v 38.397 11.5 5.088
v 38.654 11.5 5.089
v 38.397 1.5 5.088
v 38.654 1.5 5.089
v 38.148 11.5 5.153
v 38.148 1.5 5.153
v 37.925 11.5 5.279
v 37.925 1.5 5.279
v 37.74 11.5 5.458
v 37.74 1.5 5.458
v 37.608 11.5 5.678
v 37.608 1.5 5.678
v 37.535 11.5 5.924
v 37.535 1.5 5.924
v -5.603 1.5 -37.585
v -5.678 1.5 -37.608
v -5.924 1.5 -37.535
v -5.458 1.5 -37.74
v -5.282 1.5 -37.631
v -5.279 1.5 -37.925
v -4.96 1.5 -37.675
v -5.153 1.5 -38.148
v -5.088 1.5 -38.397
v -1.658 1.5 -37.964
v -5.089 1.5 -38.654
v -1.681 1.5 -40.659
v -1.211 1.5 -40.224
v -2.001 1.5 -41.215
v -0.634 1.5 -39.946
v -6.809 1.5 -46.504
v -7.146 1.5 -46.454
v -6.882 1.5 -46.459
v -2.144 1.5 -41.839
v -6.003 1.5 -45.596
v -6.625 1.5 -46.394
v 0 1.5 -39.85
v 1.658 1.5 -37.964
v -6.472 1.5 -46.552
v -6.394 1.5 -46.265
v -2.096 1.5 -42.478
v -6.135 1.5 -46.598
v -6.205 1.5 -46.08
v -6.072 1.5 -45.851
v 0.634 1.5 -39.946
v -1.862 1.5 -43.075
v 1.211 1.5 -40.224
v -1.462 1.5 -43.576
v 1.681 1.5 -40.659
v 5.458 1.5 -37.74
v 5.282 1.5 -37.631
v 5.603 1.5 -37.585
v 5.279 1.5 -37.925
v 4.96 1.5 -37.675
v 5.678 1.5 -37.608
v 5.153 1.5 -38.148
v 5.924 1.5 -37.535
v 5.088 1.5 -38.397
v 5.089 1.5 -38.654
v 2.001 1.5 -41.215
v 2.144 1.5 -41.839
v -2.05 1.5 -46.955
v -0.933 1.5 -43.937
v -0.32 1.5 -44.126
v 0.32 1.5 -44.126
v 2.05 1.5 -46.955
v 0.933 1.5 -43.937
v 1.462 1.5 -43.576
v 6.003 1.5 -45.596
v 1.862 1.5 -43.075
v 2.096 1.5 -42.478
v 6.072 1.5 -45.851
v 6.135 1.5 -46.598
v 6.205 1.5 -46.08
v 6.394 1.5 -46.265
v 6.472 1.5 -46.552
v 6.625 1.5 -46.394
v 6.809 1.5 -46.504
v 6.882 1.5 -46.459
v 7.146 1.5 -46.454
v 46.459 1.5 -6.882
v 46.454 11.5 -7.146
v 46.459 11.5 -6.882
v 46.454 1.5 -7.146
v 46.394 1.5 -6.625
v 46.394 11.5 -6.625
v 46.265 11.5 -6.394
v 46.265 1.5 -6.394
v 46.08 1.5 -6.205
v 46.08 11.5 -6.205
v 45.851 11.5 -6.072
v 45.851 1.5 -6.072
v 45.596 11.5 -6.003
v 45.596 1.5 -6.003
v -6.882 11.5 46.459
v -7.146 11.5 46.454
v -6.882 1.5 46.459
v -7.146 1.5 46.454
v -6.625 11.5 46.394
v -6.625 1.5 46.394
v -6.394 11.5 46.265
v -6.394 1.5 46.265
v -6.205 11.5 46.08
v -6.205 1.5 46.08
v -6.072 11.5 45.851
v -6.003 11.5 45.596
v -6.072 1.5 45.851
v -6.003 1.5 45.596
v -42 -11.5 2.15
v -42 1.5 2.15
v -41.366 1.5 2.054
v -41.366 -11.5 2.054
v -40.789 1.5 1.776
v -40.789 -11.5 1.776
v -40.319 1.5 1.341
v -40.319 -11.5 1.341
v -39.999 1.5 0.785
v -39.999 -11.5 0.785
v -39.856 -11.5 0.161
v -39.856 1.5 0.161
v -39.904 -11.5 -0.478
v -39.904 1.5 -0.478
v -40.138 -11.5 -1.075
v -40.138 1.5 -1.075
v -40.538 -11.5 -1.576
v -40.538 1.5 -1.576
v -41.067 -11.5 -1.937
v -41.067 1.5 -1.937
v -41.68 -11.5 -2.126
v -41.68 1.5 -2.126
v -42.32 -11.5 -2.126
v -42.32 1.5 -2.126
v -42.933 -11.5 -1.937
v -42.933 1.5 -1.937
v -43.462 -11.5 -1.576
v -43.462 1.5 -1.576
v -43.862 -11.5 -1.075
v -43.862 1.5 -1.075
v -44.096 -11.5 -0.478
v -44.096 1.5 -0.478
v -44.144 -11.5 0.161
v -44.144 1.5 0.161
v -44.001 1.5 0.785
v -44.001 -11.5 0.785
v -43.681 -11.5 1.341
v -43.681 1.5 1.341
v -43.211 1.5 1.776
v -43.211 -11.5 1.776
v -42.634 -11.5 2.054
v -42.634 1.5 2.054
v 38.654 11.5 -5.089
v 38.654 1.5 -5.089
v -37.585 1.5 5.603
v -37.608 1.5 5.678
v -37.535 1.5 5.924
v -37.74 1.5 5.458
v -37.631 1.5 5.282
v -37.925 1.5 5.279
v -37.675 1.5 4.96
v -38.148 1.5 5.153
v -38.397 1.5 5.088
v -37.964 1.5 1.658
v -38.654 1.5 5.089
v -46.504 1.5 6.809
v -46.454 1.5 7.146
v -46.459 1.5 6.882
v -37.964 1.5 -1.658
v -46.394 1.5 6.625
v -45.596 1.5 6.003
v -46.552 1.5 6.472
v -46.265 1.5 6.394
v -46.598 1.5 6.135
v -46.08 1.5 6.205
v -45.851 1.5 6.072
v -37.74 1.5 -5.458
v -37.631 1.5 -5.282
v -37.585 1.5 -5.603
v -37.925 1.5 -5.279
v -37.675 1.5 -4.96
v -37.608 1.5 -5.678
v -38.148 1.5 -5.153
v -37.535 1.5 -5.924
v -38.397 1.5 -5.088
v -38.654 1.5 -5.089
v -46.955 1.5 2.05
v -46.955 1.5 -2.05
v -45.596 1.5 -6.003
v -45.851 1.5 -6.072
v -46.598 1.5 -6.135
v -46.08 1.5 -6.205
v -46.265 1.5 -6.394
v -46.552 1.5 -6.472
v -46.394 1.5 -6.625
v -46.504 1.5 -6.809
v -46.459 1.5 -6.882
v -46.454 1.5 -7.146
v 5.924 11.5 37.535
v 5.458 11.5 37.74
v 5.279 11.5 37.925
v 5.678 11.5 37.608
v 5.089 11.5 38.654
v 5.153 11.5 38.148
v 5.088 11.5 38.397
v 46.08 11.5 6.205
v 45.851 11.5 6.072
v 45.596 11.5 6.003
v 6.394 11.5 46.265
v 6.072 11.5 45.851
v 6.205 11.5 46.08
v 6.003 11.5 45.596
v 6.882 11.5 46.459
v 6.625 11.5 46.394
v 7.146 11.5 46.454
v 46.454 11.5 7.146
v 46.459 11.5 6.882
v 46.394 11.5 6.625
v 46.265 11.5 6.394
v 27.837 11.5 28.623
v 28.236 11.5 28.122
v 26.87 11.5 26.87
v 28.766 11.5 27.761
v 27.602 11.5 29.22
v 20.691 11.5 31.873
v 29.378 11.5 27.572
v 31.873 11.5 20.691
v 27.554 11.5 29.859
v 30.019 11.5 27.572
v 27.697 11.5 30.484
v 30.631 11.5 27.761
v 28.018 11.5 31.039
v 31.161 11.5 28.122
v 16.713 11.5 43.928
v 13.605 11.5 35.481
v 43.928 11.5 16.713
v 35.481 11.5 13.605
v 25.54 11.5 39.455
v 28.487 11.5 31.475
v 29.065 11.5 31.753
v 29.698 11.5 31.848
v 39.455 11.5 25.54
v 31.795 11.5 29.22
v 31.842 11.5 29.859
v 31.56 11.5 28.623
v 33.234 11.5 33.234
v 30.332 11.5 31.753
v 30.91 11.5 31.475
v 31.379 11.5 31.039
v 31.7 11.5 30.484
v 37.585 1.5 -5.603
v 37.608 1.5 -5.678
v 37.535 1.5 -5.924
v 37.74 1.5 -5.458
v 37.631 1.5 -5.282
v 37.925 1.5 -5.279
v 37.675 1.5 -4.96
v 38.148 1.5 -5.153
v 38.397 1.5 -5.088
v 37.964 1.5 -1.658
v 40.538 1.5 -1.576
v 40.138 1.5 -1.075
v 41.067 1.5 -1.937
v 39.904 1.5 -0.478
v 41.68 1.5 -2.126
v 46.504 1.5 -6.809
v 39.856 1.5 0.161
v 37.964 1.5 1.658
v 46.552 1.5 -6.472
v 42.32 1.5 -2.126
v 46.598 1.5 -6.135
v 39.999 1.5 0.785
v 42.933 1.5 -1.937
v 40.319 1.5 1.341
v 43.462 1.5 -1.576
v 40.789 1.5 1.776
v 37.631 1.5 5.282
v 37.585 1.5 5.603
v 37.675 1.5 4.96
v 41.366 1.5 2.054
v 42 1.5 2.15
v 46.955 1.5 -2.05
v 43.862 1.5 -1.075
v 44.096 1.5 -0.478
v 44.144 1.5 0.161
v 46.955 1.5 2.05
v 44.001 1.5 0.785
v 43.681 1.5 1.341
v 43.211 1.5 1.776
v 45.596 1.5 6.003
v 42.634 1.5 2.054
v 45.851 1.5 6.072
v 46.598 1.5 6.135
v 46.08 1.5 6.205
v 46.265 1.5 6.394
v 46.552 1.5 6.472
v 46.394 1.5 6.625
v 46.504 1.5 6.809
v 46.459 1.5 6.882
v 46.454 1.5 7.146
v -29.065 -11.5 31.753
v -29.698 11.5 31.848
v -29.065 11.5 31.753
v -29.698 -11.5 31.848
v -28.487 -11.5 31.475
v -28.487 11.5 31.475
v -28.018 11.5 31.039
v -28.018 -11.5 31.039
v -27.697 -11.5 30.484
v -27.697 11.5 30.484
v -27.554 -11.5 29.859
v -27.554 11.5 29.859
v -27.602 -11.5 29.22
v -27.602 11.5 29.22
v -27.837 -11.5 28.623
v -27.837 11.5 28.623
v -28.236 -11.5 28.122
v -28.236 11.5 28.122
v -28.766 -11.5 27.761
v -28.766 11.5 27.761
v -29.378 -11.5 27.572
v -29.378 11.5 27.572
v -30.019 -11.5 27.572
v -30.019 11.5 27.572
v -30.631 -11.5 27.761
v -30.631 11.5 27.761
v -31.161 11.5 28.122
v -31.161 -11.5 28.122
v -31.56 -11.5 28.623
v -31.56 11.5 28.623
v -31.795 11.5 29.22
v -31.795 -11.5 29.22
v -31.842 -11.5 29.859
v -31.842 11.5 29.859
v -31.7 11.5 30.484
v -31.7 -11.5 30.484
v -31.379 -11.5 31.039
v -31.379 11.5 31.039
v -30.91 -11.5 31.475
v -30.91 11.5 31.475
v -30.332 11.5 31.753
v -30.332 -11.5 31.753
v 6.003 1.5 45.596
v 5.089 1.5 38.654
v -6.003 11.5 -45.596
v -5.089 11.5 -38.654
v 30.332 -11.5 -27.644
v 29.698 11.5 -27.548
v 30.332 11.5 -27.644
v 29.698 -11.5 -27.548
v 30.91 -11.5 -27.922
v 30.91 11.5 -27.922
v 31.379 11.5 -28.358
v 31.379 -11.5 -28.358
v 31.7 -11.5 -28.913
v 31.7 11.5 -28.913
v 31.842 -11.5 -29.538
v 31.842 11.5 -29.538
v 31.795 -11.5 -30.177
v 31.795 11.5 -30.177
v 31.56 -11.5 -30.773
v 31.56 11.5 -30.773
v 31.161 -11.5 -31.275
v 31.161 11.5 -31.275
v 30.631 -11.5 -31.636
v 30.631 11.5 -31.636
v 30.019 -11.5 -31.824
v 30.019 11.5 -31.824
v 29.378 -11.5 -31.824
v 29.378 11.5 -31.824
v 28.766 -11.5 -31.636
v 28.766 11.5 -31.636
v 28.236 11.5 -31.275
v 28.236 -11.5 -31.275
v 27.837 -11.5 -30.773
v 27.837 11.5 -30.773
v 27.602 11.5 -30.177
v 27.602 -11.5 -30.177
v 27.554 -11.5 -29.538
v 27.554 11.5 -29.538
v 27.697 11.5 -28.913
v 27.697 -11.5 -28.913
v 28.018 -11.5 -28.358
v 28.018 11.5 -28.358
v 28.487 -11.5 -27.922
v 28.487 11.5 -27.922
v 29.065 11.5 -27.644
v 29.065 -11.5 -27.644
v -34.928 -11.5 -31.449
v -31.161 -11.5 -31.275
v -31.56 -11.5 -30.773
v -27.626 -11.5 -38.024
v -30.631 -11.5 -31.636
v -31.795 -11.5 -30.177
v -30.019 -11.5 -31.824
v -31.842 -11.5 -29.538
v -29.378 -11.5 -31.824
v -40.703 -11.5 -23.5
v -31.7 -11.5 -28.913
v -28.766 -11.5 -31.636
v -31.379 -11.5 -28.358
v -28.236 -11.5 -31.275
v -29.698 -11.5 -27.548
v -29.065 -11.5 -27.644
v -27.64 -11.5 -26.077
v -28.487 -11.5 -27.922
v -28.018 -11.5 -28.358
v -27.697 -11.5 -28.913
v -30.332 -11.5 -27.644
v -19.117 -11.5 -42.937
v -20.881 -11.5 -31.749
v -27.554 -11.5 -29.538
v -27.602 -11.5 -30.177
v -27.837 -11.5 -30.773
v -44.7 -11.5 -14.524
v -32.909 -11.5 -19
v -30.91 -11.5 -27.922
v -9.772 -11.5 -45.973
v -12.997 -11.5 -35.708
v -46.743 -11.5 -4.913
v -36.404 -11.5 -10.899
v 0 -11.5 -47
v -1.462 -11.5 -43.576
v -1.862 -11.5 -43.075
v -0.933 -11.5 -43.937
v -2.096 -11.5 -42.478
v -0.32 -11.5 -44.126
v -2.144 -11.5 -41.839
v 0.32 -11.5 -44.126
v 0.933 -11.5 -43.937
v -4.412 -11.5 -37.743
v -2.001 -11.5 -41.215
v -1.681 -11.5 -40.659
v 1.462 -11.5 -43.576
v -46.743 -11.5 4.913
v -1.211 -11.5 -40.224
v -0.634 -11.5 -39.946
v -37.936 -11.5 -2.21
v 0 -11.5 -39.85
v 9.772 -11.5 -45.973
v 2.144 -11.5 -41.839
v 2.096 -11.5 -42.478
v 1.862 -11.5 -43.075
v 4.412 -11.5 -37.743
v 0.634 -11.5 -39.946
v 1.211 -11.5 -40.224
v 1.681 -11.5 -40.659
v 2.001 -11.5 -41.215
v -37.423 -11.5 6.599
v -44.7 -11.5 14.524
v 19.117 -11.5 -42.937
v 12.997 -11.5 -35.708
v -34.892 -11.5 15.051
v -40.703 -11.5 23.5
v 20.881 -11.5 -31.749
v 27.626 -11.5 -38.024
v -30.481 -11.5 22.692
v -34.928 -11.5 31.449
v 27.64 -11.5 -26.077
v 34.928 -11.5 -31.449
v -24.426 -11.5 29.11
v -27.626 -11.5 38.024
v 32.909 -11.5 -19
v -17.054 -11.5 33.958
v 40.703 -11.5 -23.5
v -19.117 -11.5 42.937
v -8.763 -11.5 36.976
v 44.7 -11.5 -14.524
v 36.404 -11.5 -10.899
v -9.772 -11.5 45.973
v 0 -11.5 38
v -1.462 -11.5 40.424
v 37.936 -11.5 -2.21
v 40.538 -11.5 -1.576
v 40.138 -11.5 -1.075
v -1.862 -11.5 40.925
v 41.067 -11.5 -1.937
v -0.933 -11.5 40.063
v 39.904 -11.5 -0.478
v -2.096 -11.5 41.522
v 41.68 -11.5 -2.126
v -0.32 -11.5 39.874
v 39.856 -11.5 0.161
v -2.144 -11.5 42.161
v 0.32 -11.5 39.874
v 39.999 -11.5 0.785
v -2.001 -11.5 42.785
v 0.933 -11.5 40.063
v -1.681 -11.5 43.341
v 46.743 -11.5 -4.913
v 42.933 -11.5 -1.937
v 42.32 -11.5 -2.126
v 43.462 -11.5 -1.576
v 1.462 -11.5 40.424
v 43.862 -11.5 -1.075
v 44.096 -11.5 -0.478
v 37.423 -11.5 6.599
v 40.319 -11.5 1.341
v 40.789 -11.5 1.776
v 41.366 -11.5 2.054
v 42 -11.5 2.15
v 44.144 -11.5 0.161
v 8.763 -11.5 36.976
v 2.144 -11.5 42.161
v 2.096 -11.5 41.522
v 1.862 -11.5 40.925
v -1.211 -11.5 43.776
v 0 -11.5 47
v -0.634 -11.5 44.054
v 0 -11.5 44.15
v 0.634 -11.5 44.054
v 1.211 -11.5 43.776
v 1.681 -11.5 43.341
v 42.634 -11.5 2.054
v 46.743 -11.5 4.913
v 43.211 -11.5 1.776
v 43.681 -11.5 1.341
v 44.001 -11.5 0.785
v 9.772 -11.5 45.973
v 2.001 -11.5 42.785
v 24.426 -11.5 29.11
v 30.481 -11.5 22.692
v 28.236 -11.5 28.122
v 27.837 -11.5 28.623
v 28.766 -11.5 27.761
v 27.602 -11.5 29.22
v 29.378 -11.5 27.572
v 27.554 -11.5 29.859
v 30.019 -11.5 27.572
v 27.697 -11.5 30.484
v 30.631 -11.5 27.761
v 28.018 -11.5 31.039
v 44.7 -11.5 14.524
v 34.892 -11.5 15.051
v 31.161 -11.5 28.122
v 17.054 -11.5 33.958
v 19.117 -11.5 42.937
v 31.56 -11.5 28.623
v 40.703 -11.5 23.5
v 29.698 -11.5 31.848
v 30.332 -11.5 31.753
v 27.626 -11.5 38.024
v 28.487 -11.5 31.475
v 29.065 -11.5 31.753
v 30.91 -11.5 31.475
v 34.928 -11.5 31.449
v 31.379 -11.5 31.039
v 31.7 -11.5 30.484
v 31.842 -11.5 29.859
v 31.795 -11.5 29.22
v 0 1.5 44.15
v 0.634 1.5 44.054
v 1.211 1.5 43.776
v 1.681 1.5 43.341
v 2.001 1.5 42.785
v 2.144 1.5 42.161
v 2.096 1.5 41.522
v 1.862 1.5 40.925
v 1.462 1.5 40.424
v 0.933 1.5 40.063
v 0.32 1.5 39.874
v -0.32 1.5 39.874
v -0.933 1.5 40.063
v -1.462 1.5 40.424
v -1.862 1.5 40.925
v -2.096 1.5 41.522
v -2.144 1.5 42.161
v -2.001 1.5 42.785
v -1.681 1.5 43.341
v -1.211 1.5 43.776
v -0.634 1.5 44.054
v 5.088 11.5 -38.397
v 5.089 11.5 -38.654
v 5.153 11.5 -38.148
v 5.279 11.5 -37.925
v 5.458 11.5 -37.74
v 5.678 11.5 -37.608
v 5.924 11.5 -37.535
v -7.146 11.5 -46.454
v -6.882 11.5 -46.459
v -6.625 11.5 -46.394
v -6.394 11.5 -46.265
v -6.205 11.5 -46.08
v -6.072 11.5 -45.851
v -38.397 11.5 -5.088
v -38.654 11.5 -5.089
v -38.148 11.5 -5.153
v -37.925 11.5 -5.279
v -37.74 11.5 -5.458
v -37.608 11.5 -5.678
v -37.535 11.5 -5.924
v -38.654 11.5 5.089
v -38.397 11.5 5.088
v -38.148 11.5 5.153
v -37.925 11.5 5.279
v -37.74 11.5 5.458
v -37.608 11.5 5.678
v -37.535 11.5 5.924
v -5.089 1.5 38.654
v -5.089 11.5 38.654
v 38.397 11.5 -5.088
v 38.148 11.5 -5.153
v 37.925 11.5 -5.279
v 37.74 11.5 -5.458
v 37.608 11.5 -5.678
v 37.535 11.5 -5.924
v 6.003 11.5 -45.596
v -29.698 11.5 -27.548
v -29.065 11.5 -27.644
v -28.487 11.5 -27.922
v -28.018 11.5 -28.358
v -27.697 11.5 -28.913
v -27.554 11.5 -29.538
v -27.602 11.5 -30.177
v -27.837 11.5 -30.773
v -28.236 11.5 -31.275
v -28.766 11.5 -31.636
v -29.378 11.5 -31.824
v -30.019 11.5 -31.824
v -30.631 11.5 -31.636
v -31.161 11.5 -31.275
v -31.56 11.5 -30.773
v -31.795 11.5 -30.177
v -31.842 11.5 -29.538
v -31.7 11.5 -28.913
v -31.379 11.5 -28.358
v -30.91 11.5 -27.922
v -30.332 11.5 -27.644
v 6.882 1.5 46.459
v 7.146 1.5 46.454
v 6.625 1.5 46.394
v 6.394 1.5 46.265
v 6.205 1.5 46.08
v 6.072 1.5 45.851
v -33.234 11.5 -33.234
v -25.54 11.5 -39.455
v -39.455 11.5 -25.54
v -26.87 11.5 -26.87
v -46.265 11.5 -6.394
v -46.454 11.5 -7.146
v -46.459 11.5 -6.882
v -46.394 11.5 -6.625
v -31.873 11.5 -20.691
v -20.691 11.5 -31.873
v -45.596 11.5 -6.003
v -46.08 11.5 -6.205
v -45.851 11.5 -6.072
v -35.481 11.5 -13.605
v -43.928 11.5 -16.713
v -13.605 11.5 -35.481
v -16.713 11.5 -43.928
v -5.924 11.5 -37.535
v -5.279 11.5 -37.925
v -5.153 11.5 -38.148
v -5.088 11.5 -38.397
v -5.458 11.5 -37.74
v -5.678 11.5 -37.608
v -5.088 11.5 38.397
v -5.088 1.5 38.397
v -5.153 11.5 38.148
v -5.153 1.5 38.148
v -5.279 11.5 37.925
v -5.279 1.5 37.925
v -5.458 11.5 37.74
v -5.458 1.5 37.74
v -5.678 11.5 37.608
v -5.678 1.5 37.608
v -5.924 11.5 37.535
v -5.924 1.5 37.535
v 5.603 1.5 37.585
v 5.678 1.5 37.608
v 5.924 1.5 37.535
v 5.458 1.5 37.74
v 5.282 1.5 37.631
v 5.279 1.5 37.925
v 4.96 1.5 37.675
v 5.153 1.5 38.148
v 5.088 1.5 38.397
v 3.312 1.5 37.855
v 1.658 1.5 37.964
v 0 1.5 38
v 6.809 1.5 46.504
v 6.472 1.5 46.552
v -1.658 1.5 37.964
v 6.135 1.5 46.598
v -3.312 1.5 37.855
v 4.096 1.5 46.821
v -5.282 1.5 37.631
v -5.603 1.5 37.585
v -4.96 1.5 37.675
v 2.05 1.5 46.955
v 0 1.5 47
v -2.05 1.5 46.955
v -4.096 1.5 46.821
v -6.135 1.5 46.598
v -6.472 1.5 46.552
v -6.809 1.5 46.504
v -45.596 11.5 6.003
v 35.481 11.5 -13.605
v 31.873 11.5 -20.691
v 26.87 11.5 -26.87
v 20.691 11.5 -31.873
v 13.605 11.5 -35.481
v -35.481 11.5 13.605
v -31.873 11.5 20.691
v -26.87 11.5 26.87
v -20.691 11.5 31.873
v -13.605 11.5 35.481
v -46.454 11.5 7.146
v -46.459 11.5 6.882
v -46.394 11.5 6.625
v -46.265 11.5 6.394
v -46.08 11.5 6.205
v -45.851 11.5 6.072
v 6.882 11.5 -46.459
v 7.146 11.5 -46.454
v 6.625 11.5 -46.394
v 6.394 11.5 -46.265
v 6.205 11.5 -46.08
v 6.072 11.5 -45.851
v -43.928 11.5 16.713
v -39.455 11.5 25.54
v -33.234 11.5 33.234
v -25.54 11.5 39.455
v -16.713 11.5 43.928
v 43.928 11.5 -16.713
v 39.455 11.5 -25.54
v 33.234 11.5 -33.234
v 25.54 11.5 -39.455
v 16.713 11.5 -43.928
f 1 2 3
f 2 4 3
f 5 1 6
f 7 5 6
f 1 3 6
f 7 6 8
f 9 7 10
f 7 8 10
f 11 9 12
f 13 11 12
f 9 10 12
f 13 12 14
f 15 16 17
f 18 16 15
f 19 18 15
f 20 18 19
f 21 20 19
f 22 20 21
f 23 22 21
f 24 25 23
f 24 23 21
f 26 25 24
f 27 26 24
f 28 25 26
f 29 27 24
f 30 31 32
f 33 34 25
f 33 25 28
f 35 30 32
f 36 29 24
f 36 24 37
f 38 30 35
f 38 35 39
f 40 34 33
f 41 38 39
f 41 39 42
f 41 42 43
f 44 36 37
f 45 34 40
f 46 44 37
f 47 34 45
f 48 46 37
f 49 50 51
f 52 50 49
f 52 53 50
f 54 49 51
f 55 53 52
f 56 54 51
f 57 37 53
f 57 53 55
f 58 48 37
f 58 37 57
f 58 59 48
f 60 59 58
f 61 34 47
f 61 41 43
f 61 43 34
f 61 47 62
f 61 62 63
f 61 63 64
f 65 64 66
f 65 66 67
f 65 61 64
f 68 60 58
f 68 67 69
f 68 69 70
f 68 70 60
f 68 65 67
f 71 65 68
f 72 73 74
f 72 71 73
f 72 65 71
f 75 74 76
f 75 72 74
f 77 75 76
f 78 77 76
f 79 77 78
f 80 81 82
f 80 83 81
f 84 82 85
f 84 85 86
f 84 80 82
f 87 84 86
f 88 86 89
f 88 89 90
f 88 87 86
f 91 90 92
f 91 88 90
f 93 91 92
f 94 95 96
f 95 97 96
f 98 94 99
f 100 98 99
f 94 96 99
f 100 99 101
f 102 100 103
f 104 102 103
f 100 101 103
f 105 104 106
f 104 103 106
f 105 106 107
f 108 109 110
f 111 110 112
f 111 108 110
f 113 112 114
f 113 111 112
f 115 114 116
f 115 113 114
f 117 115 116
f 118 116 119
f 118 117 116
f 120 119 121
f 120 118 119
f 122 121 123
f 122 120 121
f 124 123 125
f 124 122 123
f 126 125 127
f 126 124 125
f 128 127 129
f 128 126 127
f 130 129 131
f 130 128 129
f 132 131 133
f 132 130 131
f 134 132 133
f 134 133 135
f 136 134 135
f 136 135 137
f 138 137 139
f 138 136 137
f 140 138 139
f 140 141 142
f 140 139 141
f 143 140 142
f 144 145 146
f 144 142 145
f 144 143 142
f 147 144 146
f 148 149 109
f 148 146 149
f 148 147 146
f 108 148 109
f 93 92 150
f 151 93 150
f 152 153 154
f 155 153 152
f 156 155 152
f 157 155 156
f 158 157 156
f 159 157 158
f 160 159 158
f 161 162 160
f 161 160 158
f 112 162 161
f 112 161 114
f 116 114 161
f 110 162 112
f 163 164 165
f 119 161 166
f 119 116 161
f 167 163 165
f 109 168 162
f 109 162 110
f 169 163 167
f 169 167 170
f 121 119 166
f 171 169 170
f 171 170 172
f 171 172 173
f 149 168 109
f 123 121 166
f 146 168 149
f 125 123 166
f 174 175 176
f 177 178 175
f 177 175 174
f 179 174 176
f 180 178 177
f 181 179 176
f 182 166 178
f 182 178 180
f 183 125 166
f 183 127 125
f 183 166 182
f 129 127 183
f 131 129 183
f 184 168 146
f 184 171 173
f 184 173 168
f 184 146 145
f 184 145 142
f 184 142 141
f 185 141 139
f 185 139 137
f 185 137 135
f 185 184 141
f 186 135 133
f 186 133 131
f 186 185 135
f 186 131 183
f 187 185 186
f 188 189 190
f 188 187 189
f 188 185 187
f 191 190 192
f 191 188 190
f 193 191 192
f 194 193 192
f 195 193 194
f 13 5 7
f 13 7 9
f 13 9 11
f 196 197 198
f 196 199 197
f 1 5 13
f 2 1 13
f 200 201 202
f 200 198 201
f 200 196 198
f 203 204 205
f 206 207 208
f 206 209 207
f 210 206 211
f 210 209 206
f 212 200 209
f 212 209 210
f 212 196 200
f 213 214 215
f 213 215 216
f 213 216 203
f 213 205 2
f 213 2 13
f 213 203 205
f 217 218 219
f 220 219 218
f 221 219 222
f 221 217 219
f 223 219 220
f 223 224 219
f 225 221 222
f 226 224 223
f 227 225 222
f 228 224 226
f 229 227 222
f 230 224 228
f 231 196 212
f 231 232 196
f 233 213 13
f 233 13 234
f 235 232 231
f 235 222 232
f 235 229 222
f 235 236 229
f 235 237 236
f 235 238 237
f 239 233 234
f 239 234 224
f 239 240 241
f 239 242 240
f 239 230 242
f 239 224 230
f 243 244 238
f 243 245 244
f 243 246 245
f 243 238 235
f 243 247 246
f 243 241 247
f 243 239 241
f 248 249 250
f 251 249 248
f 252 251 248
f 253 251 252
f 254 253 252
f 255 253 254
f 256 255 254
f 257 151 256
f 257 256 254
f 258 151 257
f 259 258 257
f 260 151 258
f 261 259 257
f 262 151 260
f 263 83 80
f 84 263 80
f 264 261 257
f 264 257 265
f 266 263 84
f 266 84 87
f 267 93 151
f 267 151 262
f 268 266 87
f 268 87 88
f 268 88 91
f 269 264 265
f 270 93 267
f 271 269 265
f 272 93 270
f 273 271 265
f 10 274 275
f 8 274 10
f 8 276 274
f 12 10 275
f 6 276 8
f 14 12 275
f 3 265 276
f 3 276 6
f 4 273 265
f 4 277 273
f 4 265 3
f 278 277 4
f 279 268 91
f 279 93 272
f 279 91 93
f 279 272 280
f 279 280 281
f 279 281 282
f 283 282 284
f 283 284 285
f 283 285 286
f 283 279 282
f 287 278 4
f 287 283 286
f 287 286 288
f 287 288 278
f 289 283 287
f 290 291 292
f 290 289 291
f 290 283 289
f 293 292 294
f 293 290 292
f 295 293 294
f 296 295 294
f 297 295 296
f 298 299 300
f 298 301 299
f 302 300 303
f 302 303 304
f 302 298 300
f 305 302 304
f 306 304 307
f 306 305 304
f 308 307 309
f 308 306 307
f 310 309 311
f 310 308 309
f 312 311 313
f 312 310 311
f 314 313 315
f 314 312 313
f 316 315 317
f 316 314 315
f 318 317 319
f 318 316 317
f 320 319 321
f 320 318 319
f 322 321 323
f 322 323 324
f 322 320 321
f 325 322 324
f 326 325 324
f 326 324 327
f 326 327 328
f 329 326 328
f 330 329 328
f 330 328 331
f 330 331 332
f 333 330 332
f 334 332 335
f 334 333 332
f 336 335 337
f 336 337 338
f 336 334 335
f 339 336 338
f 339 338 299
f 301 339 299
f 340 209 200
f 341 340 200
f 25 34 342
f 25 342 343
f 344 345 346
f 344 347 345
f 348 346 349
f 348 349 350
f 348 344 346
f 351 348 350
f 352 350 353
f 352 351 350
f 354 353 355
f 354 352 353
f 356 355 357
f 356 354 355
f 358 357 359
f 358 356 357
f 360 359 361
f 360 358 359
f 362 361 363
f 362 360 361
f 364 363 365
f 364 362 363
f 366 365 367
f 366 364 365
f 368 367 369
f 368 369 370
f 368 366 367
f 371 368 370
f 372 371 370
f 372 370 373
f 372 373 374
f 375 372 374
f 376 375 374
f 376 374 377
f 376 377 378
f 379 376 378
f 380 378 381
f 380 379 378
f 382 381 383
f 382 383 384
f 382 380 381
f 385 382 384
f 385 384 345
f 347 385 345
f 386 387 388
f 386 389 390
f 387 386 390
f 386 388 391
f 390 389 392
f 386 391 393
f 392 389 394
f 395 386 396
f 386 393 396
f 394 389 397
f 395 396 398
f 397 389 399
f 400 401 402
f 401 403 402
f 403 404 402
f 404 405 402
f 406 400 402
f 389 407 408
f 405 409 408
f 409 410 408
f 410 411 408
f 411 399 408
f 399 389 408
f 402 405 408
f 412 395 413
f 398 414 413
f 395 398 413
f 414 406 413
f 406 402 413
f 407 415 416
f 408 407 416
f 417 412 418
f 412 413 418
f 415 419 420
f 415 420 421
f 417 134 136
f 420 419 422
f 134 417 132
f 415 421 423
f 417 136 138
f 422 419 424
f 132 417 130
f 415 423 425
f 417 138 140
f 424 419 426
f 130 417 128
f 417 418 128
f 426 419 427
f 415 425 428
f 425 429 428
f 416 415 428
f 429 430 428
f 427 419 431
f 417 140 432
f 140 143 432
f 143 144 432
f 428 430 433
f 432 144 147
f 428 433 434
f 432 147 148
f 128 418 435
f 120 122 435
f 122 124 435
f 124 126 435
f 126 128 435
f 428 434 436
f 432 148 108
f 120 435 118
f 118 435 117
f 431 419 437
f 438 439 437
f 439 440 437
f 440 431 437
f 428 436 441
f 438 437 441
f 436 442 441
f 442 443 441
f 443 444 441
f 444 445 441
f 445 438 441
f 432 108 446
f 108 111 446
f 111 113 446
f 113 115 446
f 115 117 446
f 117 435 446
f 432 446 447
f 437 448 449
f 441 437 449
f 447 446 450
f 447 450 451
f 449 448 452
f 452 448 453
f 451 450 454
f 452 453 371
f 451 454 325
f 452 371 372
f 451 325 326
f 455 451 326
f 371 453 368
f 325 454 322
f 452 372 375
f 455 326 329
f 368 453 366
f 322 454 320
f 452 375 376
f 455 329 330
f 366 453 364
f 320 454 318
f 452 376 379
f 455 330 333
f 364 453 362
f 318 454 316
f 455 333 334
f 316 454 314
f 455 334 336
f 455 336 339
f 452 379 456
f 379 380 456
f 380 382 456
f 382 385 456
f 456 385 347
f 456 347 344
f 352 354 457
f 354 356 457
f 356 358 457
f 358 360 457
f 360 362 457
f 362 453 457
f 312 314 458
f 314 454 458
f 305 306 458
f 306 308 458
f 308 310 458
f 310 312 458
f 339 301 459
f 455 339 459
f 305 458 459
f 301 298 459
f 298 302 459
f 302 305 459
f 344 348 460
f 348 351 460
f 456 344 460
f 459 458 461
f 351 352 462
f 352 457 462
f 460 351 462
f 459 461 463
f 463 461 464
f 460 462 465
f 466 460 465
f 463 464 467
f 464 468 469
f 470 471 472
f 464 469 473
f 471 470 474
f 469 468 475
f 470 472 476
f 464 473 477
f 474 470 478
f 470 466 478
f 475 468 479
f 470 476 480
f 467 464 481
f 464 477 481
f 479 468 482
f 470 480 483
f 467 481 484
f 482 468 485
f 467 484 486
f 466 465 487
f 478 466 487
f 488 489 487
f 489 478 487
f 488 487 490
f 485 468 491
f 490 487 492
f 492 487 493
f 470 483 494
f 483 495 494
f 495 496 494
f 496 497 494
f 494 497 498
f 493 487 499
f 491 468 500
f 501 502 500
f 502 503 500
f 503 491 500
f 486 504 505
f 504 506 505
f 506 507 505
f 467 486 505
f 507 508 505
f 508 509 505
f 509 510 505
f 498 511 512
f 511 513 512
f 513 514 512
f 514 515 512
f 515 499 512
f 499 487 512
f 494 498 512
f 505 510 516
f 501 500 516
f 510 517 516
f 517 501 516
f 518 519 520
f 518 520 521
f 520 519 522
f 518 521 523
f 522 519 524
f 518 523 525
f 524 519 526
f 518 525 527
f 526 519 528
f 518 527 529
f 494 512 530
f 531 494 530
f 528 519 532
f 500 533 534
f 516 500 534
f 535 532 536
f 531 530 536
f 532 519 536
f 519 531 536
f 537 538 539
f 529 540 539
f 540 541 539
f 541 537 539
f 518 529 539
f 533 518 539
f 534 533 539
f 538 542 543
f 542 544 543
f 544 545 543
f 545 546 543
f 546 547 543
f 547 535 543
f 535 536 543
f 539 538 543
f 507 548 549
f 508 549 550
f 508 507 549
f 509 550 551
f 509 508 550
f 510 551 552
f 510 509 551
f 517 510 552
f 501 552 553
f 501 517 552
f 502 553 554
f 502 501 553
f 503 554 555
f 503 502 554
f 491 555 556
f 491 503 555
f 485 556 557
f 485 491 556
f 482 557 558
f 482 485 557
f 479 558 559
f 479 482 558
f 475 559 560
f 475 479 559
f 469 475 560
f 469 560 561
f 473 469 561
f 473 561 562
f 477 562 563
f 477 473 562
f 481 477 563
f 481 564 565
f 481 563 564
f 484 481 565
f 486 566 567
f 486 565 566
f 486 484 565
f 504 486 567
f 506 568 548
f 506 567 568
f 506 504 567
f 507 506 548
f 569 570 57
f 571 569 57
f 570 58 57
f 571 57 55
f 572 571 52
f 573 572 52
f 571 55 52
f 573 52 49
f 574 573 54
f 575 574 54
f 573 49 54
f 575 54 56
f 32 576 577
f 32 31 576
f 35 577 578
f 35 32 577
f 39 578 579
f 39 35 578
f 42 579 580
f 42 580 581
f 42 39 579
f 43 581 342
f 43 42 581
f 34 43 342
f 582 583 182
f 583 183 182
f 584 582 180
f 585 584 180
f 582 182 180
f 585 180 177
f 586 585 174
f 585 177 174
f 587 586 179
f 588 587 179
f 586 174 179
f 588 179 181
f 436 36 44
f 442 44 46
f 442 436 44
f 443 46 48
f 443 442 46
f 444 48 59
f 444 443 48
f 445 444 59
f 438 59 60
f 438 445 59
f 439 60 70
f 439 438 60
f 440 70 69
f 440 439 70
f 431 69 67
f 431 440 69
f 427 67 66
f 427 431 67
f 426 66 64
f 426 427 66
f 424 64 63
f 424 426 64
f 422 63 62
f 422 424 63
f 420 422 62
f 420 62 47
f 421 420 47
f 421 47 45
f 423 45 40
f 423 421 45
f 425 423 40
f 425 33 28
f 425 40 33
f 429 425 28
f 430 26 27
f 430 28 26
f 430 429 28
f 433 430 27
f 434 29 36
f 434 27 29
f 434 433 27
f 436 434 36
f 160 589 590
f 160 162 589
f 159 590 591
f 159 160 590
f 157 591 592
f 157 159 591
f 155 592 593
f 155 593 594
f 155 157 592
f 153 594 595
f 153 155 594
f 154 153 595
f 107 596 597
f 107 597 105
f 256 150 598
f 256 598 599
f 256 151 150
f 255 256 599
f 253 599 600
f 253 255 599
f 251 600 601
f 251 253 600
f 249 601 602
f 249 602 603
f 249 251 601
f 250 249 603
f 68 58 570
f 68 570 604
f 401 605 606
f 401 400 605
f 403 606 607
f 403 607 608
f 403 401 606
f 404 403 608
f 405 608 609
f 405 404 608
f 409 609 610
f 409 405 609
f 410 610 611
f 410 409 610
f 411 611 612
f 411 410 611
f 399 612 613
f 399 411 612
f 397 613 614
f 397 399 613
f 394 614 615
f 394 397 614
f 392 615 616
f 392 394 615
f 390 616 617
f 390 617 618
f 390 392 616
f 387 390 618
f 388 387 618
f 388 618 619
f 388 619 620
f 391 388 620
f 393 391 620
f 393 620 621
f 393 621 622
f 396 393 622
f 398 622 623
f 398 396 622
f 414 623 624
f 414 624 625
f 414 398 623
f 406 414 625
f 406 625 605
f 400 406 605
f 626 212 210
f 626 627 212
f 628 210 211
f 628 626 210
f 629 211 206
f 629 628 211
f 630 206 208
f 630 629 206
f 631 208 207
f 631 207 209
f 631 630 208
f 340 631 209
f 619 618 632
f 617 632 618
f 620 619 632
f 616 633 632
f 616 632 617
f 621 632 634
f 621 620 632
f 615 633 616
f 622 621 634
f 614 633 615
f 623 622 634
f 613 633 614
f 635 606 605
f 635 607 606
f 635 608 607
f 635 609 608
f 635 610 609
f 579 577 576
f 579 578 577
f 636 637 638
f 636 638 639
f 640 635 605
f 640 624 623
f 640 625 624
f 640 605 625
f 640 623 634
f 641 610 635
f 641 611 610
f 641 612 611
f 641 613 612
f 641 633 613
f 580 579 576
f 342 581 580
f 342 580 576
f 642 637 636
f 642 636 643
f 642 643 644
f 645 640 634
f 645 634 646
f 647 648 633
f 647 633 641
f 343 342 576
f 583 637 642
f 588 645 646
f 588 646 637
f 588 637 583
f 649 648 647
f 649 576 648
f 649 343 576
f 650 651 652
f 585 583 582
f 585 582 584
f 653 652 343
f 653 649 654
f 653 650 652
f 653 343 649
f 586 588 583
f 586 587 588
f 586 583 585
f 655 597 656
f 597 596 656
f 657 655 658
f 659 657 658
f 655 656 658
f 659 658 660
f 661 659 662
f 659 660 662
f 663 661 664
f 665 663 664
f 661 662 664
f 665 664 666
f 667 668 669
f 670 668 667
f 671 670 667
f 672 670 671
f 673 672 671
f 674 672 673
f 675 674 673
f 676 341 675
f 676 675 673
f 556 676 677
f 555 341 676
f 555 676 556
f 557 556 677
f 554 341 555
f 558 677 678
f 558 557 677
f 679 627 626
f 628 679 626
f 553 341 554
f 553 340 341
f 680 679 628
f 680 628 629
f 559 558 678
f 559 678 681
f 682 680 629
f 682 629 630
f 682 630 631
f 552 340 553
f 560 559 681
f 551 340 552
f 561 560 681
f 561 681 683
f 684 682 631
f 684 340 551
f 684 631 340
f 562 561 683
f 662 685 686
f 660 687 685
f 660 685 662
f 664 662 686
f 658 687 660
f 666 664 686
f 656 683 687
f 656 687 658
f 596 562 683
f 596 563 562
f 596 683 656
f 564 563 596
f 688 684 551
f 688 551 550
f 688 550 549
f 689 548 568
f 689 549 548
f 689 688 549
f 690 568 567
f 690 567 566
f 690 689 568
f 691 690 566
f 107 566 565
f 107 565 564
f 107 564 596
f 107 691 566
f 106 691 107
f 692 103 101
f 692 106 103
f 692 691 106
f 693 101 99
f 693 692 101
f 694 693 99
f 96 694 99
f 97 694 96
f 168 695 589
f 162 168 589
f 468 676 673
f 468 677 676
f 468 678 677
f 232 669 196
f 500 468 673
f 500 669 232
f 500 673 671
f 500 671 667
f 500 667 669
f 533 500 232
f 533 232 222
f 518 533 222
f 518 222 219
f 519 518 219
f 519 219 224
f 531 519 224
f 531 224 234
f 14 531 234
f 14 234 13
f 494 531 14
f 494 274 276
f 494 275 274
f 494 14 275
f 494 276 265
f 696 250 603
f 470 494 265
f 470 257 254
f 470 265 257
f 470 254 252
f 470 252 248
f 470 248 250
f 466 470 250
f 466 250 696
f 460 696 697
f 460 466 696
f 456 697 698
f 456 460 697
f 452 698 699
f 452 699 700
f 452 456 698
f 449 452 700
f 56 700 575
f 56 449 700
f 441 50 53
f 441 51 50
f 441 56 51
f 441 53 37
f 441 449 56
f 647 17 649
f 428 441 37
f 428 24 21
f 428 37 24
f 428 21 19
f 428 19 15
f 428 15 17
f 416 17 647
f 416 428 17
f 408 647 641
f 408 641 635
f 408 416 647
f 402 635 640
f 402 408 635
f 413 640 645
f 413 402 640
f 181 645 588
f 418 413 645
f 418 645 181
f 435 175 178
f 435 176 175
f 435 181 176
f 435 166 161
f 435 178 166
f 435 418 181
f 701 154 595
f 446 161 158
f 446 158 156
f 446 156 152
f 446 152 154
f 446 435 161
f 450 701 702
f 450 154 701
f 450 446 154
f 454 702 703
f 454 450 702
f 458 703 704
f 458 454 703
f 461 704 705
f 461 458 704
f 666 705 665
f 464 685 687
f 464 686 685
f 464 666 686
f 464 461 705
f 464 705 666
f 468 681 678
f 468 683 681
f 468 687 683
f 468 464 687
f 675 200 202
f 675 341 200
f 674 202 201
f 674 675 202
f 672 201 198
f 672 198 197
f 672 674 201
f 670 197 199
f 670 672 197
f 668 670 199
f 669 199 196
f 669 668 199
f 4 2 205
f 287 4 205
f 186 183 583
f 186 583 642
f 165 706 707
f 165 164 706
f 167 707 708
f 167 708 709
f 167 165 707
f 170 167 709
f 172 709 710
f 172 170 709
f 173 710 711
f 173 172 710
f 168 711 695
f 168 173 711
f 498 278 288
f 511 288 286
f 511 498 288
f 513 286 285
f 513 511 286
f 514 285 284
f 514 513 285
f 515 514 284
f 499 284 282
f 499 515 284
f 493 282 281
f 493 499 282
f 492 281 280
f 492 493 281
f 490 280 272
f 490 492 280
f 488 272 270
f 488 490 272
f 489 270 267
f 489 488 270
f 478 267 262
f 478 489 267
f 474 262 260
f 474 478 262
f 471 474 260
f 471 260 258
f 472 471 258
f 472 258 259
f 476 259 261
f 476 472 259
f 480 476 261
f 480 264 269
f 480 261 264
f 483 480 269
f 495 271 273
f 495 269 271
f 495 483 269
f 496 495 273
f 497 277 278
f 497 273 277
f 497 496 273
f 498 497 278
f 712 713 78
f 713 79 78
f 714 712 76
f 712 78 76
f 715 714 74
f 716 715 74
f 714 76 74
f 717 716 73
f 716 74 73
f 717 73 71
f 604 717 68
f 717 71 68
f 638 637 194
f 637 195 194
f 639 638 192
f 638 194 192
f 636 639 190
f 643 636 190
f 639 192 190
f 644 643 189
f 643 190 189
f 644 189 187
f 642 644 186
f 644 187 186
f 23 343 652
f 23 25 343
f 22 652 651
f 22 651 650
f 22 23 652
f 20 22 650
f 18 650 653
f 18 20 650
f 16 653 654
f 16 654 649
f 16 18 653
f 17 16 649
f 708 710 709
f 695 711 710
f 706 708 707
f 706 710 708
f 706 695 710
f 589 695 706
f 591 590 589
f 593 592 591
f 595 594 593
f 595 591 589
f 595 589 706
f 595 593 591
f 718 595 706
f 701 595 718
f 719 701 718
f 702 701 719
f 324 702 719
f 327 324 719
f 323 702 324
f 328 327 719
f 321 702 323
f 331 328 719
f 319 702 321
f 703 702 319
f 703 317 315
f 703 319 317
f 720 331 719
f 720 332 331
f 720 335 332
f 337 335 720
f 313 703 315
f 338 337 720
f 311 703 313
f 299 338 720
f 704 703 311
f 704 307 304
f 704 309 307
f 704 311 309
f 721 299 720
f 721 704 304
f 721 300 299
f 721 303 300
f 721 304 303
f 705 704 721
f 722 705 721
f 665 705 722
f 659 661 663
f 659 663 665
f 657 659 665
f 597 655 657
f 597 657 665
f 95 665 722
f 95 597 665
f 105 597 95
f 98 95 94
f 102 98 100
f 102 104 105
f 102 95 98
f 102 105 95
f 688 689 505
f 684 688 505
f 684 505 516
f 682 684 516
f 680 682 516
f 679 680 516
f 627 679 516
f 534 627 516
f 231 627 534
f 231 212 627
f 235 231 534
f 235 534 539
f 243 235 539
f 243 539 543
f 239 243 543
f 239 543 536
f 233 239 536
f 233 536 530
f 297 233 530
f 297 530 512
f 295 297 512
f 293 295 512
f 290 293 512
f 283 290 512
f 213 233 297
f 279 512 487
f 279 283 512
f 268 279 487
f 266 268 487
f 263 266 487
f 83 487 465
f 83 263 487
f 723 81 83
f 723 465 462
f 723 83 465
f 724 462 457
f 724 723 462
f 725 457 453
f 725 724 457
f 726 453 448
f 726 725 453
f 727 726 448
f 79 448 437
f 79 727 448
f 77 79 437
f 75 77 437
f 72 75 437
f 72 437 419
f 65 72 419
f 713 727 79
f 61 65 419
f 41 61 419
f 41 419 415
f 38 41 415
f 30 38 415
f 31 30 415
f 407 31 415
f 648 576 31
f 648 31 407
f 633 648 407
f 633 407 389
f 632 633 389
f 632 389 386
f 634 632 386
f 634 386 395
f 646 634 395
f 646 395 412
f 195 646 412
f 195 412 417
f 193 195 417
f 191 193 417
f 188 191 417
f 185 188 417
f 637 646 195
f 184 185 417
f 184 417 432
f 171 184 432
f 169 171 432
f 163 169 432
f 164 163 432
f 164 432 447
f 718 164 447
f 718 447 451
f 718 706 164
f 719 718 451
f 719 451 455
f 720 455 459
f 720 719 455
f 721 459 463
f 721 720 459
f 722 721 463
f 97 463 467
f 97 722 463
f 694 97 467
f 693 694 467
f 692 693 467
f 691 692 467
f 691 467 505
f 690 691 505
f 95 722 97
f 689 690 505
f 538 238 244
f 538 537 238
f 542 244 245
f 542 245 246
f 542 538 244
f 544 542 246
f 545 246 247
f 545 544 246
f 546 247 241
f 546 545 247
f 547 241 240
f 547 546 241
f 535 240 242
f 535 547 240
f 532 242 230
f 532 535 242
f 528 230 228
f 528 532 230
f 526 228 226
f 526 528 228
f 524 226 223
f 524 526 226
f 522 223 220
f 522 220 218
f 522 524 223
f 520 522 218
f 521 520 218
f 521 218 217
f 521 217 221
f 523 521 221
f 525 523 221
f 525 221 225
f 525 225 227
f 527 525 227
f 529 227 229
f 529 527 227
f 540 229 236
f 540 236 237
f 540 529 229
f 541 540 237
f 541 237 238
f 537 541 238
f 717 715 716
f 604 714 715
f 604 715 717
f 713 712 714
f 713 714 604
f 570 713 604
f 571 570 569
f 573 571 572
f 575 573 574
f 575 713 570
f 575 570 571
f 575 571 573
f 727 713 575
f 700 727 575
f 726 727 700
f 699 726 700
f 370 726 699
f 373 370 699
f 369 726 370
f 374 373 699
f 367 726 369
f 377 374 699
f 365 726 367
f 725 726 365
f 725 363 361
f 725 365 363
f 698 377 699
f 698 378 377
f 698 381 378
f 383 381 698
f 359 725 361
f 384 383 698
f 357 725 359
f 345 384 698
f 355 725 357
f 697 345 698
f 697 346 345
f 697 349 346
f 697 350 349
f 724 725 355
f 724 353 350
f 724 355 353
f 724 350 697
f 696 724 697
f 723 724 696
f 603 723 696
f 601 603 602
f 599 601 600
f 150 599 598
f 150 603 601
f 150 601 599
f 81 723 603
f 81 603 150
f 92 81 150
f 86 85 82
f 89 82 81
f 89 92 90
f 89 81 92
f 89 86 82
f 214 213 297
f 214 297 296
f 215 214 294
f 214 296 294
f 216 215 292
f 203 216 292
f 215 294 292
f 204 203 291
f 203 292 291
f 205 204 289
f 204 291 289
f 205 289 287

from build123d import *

# Parameters (mm, degrees)
SKETCH1_R                = 47
SKETCH1_R_2              = 38
SKETCH1_R_3              = 2.15
BOSS_EXTRUDE1_DEPTH      = 11.5
CUT_EXTRUDE1_DEPTH       = 10
FILLET1_R                = 1
CIRPATTERN1_COUNT        = 4
CIRPATTERN1_ANGLE        = 270
FILLET1_OF_CIRPATTERN1_R = 1


with BuildPart() as part:
    # Sketch1 → Boss-Extrude1 (new, symmetric)
    with BuildSketch(Plane(origin=(0, 0, 0), x_dir=(1, 0, 0), z_dir=(0, 1, 0))):
        with Locations(Location((0, 0, 0), (0, 0, 270))):
            Circle(SKETCH1_R)
        with Locations(Location((0, 0, 0), (0, 0, 270))):
            Circle(SKETCH1_R_2, mode=Mode.SUBTRACT)
        with Locations(Location((0, 42, 0), (0, 0, 270))):
            Circle(SKETCH1_R_3, mode=Mode.SUBTRACT)
        with Locations(Location((29.69848481, 29.69848481, 0), (0, 0, 270))):
            Circle(SKETCH1_R_3, mode=Mode.SUBTRACT)
        with Locations(Location((42, 0, 0), (0, 0, 270))):
            Circle(SKETCH1_R_3, mode=Mode.SUBTRACT)
        with Locations(Location((29.69848481, -29.69848481, 0), (0, 0, 270))):
            Circle(SKETCH1_R_3, mode=Mode.SUBTRACT)
        with Locations(Location((0, -42, 0), (0, 0, 270))):
            Circle(SKETCH1_R_3, mode=Mode.SUBTRACT)
        with Locations(Location((-29.69848481, -29.69848481, 0), (0, 0, 270))):
            Circle(SKETCH1_R_3, mode=Mode.SUBTRACT)
        with Locations(Location((-42, 0, 0), (0, 0, 270))):
            Circle(SKETCH1_R_3, mode=Mode.SUBTRACT)
        with Locations(Location((-29.69848481, 29.69848481, 0), (0, 0, 270))):
            Circle(SKETCH1_R_3, mode=Mode.SUBTRACT)
    extrude(amount=BOSS_EXTRUDE1_DEPTH, both=True)

    # Sketch2 → Cut-Extrude1 (cut)
    with BuildSketch(Plane(origin=(0, 11.5, 0), x_dir=(1, 0, 0), z_dir=(0, 1, 0))):
        with BuildLine():
            Line((-6.134731034, 46.597908485), (-4.959995304, 37.674904732))
            ThreePointArc((-4.959995304, 37.674904732), (0, 38), (4.959995304, 37.674904732))
            Line((4.959995304, 37.674904732), (6.134731034, 46.597908485))
            ThreePointArc((6.134731034, 46.597908485), (0, 47), (-6.134731034, 46.597908485))
        make_face()
    cut_extrude1 = extrude(amount=-CUT_EXTRUDE1_DEPTH, mode=Mode.SUBTRACT)

    # Fillet1
    fillet1_edges = [part.edges().sort_by_distance(p)[0] for p in [
        (-6.134731034, 6.5, -46.597908485),
        (6.134731034, 6.5, -46.597908485),
        (4.959995304, 6.5, -37.674904732),
        (-4.959995304, 6.5, -37.674904732),
    ]]
    fillet(fillet1_edges, radius=FILLET1_R)

    # CirPattern1: Cut-Extrude1 ×4 about axis
    cirpattern1_axis = Axis((0, 0, 0), (0, 1, 0))
    for i in range(1, CIRPATTERN1_COUNT):
        add(cut_extrude1.rotate(cirpattern1_axis, i * CIRPATTERN1_ANGLE / (CIRPATTERN1_COUNT - 1)), mode=Mode.SUBTRACT)

    # Fillet1 of CirPattern1
    fillet1_of_cirpattern1_edges = [part.edges().sort_by_distance(p)[0] for p in [
        (-46.597908485, 6.5, 6.134731034),
        (-46.597908485, 6.5, -6.134731034),
        (-37.674904732, 6.5, -4.959995304),
        (-37.674904732, 6.5, 4.959995304),
        (6.134731034, 6.5, 46.597908485),
        (-6.134731034, 6.5, 46.597908485),
        (-4.959995304, 6.5, 37.674904732),
        (4.959995304, 6.5, 37.674904732),
        (46.597908485, 6.5, -6.134731034),
        (46.597908485, 6.5, 6.134731034),
        (37.674904732, 6.5, 4.959995304),
        (37.674904732, 6.5, -4.959995304),
    ]]
    fillet(fillet1_of_cirpattern1_edges, radius=FILLET1_OF_CIRPATTERN1_R)


solid = part.part
